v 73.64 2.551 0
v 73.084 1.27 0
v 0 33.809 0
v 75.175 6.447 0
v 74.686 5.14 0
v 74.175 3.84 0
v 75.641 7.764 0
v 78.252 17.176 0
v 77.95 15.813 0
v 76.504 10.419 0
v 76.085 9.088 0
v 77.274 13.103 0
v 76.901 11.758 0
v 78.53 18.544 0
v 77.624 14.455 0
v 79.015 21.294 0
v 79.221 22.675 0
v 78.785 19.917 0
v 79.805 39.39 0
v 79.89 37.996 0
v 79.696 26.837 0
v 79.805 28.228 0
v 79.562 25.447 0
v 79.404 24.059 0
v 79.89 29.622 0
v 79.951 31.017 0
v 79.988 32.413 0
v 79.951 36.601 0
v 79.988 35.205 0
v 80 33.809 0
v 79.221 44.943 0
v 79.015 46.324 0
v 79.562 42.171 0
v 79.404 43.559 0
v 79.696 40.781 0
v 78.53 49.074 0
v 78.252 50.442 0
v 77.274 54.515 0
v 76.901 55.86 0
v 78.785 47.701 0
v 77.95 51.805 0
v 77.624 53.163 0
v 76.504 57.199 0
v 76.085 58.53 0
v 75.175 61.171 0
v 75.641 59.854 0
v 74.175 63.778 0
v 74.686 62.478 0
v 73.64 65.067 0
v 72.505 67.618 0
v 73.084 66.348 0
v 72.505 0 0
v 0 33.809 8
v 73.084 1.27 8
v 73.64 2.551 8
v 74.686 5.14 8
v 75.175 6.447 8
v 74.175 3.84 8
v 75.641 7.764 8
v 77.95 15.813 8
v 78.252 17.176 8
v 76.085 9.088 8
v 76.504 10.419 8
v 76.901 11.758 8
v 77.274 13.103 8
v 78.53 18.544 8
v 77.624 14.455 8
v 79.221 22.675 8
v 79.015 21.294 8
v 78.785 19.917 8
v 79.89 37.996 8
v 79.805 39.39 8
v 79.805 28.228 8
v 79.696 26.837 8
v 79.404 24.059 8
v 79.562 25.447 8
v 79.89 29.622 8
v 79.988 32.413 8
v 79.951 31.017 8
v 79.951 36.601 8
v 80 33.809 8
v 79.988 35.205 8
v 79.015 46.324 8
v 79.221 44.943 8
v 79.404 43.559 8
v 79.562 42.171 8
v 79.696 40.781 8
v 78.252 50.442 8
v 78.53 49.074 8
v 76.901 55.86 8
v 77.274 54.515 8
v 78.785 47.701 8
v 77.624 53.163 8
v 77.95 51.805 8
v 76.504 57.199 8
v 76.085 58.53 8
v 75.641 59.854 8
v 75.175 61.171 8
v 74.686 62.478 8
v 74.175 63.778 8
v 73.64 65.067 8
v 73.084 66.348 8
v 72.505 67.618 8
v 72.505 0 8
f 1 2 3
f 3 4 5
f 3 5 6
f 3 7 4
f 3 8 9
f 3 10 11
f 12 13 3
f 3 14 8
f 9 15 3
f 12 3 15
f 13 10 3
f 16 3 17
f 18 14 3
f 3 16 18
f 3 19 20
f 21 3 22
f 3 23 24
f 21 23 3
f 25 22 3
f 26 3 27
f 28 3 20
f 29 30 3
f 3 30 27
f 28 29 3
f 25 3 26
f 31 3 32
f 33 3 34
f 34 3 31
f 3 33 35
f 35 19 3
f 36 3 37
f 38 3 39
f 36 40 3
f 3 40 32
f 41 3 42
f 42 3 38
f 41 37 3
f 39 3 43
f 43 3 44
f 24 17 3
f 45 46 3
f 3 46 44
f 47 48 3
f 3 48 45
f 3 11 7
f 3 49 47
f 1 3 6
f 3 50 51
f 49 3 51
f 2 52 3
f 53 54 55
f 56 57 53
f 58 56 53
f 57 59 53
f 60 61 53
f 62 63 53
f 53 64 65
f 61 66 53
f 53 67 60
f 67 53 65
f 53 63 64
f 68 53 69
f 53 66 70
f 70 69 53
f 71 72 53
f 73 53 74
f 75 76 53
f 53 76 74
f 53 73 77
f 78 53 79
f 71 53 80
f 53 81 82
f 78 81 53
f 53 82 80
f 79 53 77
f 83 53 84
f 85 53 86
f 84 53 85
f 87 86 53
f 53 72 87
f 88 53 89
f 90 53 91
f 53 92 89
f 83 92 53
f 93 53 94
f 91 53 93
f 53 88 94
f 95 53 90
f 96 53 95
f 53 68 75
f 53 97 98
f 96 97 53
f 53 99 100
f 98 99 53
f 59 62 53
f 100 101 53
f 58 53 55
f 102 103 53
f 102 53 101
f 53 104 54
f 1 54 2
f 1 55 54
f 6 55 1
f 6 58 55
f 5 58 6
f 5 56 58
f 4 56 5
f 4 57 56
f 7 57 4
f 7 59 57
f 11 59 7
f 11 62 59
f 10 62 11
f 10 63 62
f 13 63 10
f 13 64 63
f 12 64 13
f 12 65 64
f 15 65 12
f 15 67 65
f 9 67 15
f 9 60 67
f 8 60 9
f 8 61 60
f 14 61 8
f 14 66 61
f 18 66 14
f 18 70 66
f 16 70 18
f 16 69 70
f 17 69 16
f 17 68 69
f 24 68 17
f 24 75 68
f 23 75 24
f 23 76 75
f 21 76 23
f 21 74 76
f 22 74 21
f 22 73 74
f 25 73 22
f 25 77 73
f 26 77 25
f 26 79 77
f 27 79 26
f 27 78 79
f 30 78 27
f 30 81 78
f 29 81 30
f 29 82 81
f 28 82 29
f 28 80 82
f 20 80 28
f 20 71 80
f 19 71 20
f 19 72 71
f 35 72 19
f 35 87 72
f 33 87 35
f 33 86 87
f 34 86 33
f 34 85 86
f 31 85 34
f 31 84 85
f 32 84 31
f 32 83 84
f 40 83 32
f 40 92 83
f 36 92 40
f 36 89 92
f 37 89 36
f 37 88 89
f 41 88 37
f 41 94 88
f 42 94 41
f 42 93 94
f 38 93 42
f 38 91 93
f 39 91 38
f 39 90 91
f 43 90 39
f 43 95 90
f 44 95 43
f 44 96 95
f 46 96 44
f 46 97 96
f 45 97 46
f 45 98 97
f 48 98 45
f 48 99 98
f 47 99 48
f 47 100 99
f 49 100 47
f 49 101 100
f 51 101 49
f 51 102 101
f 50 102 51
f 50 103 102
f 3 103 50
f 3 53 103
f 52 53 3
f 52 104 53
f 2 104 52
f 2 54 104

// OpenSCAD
$fn = 32;

// ----------------------------------------------------------------------
// Arc profile plate: sector, 52 points
// ----------------------------------------------------------------------

// --- parameters (mm) ---
sector_angle = 50;        // sector angle, degrees
sector_r = 80;            // outer radius
arc_step = 1;             // sampling step of the arc, degrees
plate_t = 8;              // plate thickness, Z

bbox_x = 2 * sector_r * sin(sector_angle / 2);  // chord of the sector
bbox_y = sector_r;  // depth of the sector (apex to arc)

profile = [[72.505, 0], [73.084, 1.27], [73.64, 2.551], [74.175, 3.84], [74.686, 5.14], [75.175, 6.447], [75.641, 7.764], [76.085, 9.088], [76.504, 10.419], [76.901, 11.758], [77.274, 13.103], [77.624, 14.455], [77.95, 15.813], [78.252, 17.176], [78.53, 18.544], [78.785, 19.917], [79.015, 21.294], [79.221, 22.675], [79.404, 24.059], [79.562, 25.447], [79.696, 26.837], [79.805, 28.228], [79.89, 29.622], [79.951, 31.017], [79.988, 32.413], [80, 33.809], [79.988, 35.205], [79.951, 36.601], [79.89, 37.996], [79.805, 39.39], [79.696, 40.781], [79.562, 42.171], [79.404, 43.559], [79.221, 44.943], [79.015, 46.324], [78.785, 47.701], [78.53, 49.074], [78.252, 50.442], [77.95, 51.805], [77.624, 53.163], [77.274, 54.515], [76.901, 55.86], [76.504, 57.199], [76.085, 58.53], [75.641, 59.854], [75.175, 61.171], [74.686, 62.478], [74.175, 63.778], [73.64, 65.067], [73.084, 66.348], [72.505, 67.618], [0, 33.809]];  // primary outline, 52 points, counter clockwise

// --- the one profile operation ---
linear_extrude(height = plate_t) polygon(points = profile);
